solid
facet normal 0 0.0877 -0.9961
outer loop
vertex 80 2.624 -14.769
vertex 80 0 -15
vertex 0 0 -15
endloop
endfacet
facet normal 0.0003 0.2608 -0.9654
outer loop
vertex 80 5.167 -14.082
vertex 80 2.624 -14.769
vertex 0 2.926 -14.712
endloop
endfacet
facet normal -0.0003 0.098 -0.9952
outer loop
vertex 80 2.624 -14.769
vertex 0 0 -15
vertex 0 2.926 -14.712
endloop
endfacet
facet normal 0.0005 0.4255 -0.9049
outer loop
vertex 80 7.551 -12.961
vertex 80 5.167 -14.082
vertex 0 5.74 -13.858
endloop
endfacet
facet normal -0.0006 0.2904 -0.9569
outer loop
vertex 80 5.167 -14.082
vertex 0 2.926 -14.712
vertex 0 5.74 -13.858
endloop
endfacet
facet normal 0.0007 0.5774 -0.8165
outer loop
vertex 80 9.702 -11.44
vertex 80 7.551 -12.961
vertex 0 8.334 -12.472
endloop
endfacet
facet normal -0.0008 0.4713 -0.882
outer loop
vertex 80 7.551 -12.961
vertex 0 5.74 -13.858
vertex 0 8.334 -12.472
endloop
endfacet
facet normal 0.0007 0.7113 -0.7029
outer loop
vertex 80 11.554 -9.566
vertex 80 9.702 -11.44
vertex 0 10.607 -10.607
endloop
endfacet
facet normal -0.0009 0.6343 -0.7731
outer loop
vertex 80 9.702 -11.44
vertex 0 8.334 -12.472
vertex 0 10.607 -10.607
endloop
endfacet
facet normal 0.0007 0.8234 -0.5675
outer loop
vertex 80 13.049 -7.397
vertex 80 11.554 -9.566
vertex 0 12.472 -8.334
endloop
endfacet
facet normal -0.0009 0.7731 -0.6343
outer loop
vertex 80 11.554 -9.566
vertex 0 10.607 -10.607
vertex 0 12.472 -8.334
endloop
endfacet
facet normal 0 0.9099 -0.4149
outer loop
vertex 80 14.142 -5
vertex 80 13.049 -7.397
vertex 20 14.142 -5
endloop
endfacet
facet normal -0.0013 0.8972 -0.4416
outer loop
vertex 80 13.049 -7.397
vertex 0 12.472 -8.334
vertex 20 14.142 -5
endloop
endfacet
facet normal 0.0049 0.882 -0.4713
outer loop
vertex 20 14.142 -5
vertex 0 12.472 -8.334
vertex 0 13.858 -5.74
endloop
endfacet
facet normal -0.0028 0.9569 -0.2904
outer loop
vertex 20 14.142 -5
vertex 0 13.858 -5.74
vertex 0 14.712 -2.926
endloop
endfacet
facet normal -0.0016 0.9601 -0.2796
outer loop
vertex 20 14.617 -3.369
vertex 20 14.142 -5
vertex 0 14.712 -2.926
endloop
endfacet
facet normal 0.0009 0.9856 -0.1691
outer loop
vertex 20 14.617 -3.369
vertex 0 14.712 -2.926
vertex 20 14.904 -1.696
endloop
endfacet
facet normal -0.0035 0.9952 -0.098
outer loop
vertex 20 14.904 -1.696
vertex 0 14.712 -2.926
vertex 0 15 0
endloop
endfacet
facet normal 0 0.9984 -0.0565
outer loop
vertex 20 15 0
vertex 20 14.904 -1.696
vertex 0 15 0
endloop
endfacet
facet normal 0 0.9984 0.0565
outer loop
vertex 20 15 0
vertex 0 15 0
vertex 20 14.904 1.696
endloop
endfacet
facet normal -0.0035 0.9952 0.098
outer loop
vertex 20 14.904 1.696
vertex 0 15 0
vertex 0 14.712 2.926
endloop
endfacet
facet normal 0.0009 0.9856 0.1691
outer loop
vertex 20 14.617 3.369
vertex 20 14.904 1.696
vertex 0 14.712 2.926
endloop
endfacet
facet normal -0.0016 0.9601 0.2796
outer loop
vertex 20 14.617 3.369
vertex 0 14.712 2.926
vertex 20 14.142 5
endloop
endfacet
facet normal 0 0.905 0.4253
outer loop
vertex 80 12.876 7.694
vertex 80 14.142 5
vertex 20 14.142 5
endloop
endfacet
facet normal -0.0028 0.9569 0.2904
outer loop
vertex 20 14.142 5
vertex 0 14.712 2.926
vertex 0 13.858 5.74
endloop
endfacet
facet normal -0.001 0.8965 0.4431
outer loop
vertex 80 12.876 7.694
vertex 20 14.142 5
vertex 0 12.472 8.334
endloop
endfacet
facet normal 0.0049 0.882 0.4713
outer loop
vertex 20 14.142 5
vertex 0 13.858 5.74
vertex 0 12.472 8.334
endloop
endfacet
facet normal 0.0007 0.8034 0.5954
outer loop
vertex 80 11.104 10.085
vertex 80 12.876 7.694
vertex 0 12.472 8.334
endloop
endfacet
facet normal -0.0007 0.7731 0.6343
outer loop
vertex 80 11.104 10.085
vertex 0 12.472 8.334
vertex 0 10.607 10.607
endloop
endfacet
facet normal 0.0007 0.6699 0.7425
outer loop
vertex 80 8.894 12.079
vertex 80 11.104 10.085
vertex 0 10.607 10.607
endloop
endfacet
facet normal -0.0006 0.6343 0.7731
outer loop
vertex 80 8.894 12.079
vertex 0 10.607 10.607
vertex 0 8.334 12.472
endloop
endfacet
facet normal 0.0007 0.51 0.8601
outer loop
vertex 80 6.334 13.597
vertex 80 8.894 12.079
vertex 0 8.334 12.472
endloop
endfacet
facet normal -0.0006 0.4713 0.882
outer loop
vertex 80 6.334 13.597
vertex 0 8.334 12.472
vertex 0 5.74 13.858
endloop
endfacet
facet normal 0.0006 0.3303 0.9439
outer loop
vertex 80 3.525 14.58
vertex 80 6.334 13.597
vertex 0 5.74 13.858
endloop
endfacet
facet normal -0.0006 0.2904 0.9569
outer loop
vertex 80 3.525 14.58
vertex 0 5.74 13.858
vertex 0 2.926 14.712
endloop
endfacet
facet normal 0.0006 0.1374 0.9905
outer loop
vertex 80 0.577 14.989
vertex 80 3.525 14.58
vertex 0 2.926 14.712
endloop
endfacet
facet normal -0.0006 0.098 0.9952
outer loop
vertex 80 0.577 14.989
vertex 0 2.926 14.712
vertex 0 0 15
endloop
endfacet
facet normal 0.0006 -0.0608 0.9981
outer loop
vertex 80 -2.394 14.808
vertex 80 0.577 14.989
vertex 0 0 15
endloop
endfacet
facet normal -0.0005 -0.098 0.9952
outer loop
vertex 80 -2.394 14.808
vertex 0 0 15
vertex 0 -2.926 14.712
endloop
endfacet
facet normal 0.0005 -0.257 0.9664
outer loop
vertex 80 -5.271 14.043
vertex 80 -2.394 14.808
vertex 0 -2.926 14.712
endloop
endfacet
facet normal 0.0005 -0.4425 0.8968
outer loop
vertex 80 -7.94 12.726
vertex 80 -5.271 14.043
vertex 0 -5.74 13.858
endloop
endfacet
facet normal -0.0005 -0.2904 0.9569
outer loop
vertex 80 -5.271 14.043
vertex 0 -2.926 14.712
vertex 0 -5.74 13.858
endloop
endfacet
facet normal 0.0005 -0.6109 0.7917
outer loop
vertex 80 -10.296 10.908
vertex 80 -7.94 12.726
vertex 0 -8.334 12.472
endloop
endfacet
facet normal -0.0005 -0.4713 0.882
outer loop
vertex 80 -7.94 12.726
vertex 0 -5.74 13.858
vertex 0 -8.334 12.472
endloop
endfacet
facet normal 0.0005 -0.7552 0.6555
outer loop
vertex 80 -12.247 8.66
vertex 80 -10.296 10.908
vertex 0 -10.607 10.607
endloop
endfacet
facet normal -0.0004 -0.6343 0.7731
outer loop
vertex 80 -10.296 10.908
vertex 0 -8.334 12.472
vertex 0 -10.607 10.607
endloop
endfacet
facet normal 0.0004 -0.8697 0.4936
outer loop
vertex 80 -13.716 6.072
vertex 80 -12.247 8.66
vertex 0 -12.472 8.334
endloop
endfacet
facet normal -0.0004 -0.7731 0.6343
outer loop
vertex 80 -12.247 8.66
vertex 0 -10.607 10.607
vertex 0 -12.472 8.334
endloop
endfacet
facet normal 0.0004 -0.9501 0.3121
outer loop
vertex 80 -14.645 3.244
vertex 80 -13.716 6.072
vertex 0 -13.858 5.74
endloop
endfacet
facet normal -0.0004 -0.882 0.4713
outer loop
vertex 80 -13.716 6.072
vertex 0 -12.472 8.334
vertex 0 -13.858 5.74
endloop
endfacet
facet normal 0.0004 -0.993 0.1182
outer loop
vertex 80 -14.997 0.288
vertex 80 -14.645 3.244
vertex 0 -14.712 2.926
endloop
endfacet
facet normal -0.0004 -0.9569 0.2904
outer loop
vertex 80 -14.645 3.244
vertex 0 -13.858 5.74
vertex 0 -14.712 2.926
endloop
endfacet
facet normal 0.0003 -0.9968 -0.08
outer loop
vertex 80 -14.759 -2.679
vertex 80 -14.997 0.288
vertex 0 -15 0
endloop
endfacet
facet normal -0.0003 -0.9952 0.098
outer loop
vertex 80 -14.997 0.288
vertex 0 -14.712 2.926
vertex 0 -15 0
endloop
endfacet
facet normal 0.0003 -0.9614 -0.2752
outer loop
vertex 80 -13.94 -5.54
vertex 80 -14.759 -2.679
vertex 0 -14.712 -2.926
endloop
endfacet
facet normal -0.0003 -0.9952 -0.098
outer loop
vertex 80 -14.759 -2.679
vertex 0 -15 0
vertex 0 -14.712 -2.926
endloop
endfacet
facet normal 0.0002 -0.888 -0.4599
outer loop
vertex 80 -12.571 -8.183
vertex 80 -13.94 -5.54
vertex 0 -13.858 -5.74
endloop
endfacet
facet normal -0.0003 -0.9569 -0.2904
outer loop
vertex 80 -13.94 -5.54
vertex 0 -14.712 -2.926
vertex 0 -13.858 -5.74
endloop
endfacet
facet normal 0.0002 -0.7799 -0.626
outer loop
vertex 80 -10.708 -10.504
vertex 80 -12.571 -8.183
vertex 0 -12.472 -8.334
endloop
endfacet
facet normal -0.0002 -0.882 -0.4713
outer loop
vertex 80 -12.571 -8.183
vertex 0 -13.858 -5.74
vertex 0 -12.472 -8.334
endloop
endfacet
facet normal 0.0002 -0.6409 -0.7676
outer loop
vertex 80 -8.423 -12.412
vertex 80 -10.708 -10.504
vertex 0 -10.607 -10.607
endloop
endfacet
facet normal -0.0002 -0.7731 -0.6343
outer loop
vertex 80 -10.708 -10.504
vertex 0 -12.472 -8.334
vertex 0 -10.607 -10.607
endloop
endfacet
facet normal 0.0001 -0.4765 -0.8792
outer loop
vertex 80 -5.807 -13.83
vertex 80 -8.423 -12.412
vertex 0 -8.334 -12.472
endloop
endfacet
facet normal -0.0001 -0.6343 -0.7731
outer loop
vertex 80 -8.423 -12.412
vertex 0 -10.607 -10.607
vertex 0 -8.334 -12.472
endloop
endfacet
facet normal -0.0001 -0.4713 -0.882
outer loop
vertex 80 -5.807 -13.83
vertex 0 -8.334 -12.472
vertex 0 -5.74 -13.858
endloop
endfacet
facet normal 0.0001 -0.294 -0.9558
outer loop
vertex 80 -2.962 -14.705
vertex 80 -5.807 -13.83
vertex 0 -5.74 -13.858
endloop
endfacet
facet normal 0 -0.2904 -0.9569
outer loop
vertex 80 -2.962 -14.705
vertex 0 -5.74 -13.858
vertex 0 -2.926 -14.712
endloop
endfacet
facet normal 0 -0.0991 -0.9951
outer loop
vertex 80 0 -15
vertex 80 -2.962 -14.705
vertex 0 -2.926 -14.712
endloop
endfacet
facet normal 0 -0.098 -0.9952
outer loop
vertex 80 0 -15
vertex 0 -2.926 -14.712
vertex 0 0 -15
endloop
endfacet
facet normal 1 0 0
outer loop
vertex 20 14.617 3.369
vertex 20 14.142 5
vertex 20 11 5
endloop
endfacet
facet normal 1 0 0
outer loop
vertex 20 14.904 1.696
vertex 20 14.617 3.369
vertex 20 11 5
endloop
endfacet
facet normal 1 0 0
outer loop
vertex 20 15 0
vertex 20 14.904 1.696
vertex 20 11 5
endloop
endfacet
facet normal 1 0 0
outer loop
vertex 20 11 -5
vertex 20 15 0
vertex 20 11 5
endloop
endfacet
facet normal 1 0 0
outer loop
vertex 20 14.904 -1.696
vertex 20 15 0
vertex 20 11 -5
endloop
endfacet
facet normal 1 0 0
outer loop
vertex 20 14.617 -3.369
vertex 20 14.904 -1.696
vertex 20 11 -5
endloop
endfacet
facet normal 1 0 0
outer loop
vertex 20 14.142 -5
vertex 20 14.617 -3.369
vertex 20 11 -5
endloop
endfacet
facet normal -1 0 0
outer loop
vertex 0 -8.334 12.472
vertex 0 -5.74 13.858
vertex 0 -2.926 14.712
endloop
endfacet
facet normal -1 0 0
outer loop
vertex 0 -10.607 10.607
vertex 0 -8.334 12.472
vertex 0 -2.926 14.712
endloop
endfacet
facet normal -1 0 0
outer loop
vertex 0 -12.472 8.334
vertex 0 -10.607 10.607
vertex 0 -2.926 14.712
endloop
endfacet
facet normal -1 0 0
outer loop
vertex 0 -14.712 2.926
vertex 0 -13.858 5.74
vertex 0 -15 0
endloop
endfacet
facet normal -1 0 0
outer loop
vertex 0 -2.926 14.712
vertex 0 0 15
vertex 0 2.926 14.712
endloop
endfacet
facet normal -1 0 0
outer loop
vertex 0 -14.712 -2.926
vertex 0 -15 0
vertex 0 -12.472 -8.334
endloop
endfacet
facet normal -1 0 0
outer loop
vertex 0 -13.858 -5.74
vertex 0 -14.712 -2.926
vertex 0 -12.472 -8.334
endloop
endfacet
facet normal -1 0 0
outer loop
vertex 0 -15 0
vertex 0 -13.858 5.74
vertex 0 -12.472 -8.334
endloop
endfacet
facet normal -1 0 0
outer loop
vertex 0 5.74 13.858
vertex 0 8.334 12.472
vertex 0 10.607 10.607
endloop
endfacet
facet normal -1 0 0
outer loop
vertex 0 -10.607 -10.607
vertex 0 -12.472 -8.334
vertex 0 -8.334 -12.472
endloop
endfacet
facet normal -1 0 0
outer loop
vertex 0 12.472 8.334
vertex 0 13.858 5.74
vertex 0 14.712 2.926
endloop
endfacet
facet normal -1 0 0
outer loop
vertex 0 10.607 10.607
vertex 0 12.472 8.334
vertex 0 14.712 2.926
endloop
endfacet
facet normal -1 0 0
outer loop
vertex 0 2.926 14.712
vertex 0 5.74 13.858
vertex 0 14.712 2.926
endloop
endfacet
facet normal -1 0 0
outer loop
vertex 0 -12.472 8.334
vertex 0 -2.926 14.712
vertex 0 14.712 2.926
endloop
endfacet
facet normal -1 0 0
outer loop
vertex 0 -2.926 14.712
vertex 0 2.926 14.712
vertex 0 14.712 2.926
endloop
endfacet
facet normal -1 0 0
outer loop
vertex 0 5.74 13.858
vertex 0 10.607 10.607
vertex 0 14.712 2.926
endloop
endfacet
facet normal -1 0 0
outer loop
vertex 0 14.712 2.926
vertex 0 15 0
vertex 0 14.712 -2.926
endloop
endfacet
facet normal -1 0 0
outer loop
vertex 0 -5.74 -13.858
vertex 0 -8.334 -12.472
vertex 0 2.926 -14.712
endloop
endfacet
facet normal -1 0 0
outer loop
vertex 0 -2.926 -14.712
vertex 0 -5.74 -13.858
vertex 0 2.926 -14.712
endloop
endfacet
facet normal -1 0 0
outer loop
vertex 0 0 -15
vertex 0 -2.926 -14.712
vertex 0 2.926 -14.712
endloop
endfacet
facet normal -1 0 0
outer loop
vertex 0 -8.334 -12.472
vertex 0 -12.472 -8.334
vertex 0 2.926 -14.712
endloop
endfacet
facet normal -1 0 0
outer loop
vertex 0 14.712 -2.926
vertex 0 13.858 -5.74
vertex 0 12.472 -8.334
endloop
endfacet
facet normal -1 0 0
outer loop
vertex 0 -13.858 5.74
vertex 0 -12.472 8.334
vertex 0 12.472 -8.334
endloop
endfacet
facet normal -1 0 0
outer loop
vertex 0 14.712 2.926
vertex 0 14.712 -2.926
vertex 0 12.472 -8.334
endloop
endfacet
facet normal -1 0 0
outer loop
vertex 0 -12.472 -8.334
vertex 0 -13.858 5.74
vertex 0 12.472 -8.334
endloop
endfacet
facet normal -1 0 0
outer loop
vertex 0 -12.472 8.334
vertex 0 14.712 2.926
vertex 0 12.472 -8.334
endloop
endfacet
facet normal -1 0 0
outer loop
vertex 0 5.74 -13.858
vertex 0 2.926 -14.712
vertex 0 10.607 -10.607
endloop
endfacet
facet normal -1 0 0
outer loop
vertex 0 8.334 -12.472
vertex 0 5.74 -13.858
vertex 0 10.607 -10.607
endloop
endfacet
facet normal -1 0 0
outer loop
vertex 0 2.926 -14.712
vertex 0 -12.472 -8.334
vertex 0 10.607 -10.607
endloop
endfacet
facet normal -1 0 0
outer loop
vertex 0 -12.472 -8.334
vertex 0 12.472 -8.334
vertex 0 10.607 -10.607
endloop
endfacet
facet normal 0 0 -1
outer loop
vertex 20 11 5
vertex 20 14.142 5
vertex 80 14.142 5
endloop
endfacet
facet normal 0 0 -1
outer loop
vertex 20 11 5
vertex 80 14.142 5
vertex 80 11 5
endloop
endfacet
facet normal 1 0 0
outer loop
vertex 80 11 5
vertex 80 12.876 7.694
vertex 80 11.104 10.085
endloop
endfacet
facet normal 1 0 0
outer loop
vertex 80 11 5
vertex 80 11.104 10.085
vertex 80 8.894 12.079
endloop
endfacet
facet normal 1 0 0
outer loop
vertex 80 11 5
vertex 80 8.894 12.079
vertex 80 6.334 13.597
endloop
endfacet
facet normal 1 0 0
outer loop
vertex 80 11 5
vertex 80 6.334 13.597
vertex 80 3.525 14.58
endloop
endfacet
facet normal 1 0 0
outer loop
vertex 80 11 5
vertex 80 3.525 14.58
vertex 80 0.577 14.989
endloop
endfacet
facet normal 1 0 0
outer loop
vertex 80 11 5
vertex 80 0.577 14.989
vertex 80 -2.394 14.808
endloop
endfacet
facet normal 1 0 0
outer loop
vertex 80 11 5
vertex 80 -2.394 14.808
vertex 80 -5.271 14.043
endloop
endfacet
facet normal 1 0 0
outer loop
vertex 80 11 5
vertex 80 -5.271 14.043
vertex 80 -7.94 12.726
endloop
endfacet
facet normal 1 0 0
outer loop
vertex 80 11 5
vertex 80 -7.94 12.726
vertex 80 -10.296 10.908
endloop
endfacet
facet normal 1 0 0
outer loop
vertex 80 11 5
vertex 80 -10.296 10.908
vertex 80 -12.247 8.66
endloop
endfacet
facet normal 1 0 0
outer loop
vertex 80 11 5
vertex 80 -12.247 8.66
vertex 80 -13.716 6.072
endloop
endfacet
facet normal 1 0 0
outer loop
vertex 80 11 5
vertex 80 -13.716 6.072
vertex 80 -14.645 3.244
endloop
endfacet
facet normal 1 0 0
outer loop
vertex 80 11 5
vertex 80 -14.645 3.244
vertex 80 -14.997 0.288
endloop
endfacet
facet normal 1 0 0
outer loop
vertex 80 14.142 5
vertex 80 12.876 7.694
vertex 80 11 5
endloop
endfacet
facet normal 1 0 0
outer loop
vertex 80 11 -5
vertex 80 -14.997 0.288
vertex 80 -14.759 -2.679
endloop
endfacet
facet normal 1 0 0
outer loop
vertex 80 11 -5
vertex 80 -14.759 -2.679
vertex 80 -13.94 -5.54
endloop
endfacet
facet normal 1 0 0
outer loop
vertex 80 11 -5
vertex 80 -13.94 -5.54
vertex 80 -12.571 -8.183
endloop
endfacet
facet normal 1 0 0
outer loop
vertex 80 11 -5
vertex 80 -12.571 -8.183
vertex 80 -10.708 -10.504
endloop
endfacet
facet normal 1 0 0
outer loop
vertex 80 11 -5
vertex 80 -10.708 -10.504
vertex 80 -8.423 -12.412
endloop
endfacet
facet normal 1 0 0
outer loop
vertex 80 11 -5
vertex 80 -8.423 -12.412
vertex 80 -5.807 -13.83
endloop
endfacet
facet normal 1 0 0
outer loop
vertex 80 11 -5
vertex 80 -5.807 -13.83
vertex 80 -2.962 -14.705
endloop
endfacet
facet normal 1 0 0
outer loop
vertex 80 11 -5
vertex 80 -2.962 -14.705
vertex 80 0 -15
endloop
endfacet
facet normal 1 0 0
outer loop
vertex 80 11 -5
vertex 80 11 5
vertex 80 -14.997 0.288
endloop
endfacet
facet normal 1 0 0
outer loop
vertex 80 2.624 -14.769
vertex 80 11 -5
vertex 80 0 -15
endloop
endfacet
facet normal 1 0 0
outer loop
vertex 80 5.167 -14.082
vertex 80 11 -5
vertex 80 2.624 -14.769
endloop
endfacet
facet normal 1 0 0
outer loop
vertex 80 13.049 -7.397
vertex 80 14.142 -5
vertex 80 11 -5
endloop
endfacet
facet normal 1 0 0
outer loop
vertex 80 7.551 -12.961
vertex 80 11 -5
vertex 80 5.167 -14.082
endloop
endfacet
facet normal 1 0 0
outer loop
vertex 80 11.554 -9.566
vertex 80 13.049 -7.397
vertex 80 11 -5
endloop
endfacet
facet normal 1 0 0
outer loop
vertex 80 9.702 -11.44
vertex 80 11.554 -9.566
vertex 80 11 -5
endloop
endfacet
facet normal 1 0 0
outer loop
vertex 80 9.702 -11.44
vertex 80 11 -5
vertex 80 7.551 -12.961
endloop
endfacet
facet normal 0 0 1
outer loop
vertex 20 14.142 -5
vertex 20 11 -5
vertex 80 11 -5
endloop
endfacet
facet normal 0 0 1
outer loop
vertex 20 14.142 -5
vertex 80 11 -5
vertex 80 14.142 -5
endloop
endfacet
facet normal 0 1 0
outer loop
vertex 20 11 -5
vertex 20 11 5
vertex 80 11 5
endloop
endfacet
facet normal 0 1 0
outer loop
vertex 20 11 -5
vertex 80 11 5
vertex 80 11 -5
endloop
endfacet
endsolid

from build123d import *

# Parameters (mm, degrees)
SKETCH1_R           = 15
BOSS_EXTRUDE1_DEPTH = 80
CUT_EXTRUDE2_START  = -60
CUT_EXTRUDE2_DEPTH  = 60


with BuildPart() as part:
    # Sketch1 → Boss-Extrude1 (new body)
    with BuildSketch(Plane(origin=(0, 0, 0), x_dir=(0, 0, -1), z_dir=(1, 0, 0))):
        Circle(SKETCH1_R)
    extrude(amount=BOSS_EXTRUDE1_DEPTH)

    # Sketch2 → Cut-Extrude2 (cut)
    with BuildSketch(Plane(origin=(80, 0, 0), x_dir=(0, 0, -1), z_dir=(1, 0, 0)).offset(CUT_EXTRUDE2_START)):
        with BuildLine():
            ThreePointArc((5, 14.142135624), (2.536529681, 14.783978395), (0, 15))
            ThreePointArc((0, 15), (-2.536529681, 14.783978395), (-5, 14.142135624))
            Line((-5, 14.142135624), (-5, 11))
            Line((-5, 11), (0, 11))
            Line((0, 11), (5, 11))
            Line((5, 11), (5, 14.142135624))
        make_face()
    extrude(amount=CUT_EXTRUDE2_DEPTH, mode=Mode.SUBTRACT)


solid = part.part
